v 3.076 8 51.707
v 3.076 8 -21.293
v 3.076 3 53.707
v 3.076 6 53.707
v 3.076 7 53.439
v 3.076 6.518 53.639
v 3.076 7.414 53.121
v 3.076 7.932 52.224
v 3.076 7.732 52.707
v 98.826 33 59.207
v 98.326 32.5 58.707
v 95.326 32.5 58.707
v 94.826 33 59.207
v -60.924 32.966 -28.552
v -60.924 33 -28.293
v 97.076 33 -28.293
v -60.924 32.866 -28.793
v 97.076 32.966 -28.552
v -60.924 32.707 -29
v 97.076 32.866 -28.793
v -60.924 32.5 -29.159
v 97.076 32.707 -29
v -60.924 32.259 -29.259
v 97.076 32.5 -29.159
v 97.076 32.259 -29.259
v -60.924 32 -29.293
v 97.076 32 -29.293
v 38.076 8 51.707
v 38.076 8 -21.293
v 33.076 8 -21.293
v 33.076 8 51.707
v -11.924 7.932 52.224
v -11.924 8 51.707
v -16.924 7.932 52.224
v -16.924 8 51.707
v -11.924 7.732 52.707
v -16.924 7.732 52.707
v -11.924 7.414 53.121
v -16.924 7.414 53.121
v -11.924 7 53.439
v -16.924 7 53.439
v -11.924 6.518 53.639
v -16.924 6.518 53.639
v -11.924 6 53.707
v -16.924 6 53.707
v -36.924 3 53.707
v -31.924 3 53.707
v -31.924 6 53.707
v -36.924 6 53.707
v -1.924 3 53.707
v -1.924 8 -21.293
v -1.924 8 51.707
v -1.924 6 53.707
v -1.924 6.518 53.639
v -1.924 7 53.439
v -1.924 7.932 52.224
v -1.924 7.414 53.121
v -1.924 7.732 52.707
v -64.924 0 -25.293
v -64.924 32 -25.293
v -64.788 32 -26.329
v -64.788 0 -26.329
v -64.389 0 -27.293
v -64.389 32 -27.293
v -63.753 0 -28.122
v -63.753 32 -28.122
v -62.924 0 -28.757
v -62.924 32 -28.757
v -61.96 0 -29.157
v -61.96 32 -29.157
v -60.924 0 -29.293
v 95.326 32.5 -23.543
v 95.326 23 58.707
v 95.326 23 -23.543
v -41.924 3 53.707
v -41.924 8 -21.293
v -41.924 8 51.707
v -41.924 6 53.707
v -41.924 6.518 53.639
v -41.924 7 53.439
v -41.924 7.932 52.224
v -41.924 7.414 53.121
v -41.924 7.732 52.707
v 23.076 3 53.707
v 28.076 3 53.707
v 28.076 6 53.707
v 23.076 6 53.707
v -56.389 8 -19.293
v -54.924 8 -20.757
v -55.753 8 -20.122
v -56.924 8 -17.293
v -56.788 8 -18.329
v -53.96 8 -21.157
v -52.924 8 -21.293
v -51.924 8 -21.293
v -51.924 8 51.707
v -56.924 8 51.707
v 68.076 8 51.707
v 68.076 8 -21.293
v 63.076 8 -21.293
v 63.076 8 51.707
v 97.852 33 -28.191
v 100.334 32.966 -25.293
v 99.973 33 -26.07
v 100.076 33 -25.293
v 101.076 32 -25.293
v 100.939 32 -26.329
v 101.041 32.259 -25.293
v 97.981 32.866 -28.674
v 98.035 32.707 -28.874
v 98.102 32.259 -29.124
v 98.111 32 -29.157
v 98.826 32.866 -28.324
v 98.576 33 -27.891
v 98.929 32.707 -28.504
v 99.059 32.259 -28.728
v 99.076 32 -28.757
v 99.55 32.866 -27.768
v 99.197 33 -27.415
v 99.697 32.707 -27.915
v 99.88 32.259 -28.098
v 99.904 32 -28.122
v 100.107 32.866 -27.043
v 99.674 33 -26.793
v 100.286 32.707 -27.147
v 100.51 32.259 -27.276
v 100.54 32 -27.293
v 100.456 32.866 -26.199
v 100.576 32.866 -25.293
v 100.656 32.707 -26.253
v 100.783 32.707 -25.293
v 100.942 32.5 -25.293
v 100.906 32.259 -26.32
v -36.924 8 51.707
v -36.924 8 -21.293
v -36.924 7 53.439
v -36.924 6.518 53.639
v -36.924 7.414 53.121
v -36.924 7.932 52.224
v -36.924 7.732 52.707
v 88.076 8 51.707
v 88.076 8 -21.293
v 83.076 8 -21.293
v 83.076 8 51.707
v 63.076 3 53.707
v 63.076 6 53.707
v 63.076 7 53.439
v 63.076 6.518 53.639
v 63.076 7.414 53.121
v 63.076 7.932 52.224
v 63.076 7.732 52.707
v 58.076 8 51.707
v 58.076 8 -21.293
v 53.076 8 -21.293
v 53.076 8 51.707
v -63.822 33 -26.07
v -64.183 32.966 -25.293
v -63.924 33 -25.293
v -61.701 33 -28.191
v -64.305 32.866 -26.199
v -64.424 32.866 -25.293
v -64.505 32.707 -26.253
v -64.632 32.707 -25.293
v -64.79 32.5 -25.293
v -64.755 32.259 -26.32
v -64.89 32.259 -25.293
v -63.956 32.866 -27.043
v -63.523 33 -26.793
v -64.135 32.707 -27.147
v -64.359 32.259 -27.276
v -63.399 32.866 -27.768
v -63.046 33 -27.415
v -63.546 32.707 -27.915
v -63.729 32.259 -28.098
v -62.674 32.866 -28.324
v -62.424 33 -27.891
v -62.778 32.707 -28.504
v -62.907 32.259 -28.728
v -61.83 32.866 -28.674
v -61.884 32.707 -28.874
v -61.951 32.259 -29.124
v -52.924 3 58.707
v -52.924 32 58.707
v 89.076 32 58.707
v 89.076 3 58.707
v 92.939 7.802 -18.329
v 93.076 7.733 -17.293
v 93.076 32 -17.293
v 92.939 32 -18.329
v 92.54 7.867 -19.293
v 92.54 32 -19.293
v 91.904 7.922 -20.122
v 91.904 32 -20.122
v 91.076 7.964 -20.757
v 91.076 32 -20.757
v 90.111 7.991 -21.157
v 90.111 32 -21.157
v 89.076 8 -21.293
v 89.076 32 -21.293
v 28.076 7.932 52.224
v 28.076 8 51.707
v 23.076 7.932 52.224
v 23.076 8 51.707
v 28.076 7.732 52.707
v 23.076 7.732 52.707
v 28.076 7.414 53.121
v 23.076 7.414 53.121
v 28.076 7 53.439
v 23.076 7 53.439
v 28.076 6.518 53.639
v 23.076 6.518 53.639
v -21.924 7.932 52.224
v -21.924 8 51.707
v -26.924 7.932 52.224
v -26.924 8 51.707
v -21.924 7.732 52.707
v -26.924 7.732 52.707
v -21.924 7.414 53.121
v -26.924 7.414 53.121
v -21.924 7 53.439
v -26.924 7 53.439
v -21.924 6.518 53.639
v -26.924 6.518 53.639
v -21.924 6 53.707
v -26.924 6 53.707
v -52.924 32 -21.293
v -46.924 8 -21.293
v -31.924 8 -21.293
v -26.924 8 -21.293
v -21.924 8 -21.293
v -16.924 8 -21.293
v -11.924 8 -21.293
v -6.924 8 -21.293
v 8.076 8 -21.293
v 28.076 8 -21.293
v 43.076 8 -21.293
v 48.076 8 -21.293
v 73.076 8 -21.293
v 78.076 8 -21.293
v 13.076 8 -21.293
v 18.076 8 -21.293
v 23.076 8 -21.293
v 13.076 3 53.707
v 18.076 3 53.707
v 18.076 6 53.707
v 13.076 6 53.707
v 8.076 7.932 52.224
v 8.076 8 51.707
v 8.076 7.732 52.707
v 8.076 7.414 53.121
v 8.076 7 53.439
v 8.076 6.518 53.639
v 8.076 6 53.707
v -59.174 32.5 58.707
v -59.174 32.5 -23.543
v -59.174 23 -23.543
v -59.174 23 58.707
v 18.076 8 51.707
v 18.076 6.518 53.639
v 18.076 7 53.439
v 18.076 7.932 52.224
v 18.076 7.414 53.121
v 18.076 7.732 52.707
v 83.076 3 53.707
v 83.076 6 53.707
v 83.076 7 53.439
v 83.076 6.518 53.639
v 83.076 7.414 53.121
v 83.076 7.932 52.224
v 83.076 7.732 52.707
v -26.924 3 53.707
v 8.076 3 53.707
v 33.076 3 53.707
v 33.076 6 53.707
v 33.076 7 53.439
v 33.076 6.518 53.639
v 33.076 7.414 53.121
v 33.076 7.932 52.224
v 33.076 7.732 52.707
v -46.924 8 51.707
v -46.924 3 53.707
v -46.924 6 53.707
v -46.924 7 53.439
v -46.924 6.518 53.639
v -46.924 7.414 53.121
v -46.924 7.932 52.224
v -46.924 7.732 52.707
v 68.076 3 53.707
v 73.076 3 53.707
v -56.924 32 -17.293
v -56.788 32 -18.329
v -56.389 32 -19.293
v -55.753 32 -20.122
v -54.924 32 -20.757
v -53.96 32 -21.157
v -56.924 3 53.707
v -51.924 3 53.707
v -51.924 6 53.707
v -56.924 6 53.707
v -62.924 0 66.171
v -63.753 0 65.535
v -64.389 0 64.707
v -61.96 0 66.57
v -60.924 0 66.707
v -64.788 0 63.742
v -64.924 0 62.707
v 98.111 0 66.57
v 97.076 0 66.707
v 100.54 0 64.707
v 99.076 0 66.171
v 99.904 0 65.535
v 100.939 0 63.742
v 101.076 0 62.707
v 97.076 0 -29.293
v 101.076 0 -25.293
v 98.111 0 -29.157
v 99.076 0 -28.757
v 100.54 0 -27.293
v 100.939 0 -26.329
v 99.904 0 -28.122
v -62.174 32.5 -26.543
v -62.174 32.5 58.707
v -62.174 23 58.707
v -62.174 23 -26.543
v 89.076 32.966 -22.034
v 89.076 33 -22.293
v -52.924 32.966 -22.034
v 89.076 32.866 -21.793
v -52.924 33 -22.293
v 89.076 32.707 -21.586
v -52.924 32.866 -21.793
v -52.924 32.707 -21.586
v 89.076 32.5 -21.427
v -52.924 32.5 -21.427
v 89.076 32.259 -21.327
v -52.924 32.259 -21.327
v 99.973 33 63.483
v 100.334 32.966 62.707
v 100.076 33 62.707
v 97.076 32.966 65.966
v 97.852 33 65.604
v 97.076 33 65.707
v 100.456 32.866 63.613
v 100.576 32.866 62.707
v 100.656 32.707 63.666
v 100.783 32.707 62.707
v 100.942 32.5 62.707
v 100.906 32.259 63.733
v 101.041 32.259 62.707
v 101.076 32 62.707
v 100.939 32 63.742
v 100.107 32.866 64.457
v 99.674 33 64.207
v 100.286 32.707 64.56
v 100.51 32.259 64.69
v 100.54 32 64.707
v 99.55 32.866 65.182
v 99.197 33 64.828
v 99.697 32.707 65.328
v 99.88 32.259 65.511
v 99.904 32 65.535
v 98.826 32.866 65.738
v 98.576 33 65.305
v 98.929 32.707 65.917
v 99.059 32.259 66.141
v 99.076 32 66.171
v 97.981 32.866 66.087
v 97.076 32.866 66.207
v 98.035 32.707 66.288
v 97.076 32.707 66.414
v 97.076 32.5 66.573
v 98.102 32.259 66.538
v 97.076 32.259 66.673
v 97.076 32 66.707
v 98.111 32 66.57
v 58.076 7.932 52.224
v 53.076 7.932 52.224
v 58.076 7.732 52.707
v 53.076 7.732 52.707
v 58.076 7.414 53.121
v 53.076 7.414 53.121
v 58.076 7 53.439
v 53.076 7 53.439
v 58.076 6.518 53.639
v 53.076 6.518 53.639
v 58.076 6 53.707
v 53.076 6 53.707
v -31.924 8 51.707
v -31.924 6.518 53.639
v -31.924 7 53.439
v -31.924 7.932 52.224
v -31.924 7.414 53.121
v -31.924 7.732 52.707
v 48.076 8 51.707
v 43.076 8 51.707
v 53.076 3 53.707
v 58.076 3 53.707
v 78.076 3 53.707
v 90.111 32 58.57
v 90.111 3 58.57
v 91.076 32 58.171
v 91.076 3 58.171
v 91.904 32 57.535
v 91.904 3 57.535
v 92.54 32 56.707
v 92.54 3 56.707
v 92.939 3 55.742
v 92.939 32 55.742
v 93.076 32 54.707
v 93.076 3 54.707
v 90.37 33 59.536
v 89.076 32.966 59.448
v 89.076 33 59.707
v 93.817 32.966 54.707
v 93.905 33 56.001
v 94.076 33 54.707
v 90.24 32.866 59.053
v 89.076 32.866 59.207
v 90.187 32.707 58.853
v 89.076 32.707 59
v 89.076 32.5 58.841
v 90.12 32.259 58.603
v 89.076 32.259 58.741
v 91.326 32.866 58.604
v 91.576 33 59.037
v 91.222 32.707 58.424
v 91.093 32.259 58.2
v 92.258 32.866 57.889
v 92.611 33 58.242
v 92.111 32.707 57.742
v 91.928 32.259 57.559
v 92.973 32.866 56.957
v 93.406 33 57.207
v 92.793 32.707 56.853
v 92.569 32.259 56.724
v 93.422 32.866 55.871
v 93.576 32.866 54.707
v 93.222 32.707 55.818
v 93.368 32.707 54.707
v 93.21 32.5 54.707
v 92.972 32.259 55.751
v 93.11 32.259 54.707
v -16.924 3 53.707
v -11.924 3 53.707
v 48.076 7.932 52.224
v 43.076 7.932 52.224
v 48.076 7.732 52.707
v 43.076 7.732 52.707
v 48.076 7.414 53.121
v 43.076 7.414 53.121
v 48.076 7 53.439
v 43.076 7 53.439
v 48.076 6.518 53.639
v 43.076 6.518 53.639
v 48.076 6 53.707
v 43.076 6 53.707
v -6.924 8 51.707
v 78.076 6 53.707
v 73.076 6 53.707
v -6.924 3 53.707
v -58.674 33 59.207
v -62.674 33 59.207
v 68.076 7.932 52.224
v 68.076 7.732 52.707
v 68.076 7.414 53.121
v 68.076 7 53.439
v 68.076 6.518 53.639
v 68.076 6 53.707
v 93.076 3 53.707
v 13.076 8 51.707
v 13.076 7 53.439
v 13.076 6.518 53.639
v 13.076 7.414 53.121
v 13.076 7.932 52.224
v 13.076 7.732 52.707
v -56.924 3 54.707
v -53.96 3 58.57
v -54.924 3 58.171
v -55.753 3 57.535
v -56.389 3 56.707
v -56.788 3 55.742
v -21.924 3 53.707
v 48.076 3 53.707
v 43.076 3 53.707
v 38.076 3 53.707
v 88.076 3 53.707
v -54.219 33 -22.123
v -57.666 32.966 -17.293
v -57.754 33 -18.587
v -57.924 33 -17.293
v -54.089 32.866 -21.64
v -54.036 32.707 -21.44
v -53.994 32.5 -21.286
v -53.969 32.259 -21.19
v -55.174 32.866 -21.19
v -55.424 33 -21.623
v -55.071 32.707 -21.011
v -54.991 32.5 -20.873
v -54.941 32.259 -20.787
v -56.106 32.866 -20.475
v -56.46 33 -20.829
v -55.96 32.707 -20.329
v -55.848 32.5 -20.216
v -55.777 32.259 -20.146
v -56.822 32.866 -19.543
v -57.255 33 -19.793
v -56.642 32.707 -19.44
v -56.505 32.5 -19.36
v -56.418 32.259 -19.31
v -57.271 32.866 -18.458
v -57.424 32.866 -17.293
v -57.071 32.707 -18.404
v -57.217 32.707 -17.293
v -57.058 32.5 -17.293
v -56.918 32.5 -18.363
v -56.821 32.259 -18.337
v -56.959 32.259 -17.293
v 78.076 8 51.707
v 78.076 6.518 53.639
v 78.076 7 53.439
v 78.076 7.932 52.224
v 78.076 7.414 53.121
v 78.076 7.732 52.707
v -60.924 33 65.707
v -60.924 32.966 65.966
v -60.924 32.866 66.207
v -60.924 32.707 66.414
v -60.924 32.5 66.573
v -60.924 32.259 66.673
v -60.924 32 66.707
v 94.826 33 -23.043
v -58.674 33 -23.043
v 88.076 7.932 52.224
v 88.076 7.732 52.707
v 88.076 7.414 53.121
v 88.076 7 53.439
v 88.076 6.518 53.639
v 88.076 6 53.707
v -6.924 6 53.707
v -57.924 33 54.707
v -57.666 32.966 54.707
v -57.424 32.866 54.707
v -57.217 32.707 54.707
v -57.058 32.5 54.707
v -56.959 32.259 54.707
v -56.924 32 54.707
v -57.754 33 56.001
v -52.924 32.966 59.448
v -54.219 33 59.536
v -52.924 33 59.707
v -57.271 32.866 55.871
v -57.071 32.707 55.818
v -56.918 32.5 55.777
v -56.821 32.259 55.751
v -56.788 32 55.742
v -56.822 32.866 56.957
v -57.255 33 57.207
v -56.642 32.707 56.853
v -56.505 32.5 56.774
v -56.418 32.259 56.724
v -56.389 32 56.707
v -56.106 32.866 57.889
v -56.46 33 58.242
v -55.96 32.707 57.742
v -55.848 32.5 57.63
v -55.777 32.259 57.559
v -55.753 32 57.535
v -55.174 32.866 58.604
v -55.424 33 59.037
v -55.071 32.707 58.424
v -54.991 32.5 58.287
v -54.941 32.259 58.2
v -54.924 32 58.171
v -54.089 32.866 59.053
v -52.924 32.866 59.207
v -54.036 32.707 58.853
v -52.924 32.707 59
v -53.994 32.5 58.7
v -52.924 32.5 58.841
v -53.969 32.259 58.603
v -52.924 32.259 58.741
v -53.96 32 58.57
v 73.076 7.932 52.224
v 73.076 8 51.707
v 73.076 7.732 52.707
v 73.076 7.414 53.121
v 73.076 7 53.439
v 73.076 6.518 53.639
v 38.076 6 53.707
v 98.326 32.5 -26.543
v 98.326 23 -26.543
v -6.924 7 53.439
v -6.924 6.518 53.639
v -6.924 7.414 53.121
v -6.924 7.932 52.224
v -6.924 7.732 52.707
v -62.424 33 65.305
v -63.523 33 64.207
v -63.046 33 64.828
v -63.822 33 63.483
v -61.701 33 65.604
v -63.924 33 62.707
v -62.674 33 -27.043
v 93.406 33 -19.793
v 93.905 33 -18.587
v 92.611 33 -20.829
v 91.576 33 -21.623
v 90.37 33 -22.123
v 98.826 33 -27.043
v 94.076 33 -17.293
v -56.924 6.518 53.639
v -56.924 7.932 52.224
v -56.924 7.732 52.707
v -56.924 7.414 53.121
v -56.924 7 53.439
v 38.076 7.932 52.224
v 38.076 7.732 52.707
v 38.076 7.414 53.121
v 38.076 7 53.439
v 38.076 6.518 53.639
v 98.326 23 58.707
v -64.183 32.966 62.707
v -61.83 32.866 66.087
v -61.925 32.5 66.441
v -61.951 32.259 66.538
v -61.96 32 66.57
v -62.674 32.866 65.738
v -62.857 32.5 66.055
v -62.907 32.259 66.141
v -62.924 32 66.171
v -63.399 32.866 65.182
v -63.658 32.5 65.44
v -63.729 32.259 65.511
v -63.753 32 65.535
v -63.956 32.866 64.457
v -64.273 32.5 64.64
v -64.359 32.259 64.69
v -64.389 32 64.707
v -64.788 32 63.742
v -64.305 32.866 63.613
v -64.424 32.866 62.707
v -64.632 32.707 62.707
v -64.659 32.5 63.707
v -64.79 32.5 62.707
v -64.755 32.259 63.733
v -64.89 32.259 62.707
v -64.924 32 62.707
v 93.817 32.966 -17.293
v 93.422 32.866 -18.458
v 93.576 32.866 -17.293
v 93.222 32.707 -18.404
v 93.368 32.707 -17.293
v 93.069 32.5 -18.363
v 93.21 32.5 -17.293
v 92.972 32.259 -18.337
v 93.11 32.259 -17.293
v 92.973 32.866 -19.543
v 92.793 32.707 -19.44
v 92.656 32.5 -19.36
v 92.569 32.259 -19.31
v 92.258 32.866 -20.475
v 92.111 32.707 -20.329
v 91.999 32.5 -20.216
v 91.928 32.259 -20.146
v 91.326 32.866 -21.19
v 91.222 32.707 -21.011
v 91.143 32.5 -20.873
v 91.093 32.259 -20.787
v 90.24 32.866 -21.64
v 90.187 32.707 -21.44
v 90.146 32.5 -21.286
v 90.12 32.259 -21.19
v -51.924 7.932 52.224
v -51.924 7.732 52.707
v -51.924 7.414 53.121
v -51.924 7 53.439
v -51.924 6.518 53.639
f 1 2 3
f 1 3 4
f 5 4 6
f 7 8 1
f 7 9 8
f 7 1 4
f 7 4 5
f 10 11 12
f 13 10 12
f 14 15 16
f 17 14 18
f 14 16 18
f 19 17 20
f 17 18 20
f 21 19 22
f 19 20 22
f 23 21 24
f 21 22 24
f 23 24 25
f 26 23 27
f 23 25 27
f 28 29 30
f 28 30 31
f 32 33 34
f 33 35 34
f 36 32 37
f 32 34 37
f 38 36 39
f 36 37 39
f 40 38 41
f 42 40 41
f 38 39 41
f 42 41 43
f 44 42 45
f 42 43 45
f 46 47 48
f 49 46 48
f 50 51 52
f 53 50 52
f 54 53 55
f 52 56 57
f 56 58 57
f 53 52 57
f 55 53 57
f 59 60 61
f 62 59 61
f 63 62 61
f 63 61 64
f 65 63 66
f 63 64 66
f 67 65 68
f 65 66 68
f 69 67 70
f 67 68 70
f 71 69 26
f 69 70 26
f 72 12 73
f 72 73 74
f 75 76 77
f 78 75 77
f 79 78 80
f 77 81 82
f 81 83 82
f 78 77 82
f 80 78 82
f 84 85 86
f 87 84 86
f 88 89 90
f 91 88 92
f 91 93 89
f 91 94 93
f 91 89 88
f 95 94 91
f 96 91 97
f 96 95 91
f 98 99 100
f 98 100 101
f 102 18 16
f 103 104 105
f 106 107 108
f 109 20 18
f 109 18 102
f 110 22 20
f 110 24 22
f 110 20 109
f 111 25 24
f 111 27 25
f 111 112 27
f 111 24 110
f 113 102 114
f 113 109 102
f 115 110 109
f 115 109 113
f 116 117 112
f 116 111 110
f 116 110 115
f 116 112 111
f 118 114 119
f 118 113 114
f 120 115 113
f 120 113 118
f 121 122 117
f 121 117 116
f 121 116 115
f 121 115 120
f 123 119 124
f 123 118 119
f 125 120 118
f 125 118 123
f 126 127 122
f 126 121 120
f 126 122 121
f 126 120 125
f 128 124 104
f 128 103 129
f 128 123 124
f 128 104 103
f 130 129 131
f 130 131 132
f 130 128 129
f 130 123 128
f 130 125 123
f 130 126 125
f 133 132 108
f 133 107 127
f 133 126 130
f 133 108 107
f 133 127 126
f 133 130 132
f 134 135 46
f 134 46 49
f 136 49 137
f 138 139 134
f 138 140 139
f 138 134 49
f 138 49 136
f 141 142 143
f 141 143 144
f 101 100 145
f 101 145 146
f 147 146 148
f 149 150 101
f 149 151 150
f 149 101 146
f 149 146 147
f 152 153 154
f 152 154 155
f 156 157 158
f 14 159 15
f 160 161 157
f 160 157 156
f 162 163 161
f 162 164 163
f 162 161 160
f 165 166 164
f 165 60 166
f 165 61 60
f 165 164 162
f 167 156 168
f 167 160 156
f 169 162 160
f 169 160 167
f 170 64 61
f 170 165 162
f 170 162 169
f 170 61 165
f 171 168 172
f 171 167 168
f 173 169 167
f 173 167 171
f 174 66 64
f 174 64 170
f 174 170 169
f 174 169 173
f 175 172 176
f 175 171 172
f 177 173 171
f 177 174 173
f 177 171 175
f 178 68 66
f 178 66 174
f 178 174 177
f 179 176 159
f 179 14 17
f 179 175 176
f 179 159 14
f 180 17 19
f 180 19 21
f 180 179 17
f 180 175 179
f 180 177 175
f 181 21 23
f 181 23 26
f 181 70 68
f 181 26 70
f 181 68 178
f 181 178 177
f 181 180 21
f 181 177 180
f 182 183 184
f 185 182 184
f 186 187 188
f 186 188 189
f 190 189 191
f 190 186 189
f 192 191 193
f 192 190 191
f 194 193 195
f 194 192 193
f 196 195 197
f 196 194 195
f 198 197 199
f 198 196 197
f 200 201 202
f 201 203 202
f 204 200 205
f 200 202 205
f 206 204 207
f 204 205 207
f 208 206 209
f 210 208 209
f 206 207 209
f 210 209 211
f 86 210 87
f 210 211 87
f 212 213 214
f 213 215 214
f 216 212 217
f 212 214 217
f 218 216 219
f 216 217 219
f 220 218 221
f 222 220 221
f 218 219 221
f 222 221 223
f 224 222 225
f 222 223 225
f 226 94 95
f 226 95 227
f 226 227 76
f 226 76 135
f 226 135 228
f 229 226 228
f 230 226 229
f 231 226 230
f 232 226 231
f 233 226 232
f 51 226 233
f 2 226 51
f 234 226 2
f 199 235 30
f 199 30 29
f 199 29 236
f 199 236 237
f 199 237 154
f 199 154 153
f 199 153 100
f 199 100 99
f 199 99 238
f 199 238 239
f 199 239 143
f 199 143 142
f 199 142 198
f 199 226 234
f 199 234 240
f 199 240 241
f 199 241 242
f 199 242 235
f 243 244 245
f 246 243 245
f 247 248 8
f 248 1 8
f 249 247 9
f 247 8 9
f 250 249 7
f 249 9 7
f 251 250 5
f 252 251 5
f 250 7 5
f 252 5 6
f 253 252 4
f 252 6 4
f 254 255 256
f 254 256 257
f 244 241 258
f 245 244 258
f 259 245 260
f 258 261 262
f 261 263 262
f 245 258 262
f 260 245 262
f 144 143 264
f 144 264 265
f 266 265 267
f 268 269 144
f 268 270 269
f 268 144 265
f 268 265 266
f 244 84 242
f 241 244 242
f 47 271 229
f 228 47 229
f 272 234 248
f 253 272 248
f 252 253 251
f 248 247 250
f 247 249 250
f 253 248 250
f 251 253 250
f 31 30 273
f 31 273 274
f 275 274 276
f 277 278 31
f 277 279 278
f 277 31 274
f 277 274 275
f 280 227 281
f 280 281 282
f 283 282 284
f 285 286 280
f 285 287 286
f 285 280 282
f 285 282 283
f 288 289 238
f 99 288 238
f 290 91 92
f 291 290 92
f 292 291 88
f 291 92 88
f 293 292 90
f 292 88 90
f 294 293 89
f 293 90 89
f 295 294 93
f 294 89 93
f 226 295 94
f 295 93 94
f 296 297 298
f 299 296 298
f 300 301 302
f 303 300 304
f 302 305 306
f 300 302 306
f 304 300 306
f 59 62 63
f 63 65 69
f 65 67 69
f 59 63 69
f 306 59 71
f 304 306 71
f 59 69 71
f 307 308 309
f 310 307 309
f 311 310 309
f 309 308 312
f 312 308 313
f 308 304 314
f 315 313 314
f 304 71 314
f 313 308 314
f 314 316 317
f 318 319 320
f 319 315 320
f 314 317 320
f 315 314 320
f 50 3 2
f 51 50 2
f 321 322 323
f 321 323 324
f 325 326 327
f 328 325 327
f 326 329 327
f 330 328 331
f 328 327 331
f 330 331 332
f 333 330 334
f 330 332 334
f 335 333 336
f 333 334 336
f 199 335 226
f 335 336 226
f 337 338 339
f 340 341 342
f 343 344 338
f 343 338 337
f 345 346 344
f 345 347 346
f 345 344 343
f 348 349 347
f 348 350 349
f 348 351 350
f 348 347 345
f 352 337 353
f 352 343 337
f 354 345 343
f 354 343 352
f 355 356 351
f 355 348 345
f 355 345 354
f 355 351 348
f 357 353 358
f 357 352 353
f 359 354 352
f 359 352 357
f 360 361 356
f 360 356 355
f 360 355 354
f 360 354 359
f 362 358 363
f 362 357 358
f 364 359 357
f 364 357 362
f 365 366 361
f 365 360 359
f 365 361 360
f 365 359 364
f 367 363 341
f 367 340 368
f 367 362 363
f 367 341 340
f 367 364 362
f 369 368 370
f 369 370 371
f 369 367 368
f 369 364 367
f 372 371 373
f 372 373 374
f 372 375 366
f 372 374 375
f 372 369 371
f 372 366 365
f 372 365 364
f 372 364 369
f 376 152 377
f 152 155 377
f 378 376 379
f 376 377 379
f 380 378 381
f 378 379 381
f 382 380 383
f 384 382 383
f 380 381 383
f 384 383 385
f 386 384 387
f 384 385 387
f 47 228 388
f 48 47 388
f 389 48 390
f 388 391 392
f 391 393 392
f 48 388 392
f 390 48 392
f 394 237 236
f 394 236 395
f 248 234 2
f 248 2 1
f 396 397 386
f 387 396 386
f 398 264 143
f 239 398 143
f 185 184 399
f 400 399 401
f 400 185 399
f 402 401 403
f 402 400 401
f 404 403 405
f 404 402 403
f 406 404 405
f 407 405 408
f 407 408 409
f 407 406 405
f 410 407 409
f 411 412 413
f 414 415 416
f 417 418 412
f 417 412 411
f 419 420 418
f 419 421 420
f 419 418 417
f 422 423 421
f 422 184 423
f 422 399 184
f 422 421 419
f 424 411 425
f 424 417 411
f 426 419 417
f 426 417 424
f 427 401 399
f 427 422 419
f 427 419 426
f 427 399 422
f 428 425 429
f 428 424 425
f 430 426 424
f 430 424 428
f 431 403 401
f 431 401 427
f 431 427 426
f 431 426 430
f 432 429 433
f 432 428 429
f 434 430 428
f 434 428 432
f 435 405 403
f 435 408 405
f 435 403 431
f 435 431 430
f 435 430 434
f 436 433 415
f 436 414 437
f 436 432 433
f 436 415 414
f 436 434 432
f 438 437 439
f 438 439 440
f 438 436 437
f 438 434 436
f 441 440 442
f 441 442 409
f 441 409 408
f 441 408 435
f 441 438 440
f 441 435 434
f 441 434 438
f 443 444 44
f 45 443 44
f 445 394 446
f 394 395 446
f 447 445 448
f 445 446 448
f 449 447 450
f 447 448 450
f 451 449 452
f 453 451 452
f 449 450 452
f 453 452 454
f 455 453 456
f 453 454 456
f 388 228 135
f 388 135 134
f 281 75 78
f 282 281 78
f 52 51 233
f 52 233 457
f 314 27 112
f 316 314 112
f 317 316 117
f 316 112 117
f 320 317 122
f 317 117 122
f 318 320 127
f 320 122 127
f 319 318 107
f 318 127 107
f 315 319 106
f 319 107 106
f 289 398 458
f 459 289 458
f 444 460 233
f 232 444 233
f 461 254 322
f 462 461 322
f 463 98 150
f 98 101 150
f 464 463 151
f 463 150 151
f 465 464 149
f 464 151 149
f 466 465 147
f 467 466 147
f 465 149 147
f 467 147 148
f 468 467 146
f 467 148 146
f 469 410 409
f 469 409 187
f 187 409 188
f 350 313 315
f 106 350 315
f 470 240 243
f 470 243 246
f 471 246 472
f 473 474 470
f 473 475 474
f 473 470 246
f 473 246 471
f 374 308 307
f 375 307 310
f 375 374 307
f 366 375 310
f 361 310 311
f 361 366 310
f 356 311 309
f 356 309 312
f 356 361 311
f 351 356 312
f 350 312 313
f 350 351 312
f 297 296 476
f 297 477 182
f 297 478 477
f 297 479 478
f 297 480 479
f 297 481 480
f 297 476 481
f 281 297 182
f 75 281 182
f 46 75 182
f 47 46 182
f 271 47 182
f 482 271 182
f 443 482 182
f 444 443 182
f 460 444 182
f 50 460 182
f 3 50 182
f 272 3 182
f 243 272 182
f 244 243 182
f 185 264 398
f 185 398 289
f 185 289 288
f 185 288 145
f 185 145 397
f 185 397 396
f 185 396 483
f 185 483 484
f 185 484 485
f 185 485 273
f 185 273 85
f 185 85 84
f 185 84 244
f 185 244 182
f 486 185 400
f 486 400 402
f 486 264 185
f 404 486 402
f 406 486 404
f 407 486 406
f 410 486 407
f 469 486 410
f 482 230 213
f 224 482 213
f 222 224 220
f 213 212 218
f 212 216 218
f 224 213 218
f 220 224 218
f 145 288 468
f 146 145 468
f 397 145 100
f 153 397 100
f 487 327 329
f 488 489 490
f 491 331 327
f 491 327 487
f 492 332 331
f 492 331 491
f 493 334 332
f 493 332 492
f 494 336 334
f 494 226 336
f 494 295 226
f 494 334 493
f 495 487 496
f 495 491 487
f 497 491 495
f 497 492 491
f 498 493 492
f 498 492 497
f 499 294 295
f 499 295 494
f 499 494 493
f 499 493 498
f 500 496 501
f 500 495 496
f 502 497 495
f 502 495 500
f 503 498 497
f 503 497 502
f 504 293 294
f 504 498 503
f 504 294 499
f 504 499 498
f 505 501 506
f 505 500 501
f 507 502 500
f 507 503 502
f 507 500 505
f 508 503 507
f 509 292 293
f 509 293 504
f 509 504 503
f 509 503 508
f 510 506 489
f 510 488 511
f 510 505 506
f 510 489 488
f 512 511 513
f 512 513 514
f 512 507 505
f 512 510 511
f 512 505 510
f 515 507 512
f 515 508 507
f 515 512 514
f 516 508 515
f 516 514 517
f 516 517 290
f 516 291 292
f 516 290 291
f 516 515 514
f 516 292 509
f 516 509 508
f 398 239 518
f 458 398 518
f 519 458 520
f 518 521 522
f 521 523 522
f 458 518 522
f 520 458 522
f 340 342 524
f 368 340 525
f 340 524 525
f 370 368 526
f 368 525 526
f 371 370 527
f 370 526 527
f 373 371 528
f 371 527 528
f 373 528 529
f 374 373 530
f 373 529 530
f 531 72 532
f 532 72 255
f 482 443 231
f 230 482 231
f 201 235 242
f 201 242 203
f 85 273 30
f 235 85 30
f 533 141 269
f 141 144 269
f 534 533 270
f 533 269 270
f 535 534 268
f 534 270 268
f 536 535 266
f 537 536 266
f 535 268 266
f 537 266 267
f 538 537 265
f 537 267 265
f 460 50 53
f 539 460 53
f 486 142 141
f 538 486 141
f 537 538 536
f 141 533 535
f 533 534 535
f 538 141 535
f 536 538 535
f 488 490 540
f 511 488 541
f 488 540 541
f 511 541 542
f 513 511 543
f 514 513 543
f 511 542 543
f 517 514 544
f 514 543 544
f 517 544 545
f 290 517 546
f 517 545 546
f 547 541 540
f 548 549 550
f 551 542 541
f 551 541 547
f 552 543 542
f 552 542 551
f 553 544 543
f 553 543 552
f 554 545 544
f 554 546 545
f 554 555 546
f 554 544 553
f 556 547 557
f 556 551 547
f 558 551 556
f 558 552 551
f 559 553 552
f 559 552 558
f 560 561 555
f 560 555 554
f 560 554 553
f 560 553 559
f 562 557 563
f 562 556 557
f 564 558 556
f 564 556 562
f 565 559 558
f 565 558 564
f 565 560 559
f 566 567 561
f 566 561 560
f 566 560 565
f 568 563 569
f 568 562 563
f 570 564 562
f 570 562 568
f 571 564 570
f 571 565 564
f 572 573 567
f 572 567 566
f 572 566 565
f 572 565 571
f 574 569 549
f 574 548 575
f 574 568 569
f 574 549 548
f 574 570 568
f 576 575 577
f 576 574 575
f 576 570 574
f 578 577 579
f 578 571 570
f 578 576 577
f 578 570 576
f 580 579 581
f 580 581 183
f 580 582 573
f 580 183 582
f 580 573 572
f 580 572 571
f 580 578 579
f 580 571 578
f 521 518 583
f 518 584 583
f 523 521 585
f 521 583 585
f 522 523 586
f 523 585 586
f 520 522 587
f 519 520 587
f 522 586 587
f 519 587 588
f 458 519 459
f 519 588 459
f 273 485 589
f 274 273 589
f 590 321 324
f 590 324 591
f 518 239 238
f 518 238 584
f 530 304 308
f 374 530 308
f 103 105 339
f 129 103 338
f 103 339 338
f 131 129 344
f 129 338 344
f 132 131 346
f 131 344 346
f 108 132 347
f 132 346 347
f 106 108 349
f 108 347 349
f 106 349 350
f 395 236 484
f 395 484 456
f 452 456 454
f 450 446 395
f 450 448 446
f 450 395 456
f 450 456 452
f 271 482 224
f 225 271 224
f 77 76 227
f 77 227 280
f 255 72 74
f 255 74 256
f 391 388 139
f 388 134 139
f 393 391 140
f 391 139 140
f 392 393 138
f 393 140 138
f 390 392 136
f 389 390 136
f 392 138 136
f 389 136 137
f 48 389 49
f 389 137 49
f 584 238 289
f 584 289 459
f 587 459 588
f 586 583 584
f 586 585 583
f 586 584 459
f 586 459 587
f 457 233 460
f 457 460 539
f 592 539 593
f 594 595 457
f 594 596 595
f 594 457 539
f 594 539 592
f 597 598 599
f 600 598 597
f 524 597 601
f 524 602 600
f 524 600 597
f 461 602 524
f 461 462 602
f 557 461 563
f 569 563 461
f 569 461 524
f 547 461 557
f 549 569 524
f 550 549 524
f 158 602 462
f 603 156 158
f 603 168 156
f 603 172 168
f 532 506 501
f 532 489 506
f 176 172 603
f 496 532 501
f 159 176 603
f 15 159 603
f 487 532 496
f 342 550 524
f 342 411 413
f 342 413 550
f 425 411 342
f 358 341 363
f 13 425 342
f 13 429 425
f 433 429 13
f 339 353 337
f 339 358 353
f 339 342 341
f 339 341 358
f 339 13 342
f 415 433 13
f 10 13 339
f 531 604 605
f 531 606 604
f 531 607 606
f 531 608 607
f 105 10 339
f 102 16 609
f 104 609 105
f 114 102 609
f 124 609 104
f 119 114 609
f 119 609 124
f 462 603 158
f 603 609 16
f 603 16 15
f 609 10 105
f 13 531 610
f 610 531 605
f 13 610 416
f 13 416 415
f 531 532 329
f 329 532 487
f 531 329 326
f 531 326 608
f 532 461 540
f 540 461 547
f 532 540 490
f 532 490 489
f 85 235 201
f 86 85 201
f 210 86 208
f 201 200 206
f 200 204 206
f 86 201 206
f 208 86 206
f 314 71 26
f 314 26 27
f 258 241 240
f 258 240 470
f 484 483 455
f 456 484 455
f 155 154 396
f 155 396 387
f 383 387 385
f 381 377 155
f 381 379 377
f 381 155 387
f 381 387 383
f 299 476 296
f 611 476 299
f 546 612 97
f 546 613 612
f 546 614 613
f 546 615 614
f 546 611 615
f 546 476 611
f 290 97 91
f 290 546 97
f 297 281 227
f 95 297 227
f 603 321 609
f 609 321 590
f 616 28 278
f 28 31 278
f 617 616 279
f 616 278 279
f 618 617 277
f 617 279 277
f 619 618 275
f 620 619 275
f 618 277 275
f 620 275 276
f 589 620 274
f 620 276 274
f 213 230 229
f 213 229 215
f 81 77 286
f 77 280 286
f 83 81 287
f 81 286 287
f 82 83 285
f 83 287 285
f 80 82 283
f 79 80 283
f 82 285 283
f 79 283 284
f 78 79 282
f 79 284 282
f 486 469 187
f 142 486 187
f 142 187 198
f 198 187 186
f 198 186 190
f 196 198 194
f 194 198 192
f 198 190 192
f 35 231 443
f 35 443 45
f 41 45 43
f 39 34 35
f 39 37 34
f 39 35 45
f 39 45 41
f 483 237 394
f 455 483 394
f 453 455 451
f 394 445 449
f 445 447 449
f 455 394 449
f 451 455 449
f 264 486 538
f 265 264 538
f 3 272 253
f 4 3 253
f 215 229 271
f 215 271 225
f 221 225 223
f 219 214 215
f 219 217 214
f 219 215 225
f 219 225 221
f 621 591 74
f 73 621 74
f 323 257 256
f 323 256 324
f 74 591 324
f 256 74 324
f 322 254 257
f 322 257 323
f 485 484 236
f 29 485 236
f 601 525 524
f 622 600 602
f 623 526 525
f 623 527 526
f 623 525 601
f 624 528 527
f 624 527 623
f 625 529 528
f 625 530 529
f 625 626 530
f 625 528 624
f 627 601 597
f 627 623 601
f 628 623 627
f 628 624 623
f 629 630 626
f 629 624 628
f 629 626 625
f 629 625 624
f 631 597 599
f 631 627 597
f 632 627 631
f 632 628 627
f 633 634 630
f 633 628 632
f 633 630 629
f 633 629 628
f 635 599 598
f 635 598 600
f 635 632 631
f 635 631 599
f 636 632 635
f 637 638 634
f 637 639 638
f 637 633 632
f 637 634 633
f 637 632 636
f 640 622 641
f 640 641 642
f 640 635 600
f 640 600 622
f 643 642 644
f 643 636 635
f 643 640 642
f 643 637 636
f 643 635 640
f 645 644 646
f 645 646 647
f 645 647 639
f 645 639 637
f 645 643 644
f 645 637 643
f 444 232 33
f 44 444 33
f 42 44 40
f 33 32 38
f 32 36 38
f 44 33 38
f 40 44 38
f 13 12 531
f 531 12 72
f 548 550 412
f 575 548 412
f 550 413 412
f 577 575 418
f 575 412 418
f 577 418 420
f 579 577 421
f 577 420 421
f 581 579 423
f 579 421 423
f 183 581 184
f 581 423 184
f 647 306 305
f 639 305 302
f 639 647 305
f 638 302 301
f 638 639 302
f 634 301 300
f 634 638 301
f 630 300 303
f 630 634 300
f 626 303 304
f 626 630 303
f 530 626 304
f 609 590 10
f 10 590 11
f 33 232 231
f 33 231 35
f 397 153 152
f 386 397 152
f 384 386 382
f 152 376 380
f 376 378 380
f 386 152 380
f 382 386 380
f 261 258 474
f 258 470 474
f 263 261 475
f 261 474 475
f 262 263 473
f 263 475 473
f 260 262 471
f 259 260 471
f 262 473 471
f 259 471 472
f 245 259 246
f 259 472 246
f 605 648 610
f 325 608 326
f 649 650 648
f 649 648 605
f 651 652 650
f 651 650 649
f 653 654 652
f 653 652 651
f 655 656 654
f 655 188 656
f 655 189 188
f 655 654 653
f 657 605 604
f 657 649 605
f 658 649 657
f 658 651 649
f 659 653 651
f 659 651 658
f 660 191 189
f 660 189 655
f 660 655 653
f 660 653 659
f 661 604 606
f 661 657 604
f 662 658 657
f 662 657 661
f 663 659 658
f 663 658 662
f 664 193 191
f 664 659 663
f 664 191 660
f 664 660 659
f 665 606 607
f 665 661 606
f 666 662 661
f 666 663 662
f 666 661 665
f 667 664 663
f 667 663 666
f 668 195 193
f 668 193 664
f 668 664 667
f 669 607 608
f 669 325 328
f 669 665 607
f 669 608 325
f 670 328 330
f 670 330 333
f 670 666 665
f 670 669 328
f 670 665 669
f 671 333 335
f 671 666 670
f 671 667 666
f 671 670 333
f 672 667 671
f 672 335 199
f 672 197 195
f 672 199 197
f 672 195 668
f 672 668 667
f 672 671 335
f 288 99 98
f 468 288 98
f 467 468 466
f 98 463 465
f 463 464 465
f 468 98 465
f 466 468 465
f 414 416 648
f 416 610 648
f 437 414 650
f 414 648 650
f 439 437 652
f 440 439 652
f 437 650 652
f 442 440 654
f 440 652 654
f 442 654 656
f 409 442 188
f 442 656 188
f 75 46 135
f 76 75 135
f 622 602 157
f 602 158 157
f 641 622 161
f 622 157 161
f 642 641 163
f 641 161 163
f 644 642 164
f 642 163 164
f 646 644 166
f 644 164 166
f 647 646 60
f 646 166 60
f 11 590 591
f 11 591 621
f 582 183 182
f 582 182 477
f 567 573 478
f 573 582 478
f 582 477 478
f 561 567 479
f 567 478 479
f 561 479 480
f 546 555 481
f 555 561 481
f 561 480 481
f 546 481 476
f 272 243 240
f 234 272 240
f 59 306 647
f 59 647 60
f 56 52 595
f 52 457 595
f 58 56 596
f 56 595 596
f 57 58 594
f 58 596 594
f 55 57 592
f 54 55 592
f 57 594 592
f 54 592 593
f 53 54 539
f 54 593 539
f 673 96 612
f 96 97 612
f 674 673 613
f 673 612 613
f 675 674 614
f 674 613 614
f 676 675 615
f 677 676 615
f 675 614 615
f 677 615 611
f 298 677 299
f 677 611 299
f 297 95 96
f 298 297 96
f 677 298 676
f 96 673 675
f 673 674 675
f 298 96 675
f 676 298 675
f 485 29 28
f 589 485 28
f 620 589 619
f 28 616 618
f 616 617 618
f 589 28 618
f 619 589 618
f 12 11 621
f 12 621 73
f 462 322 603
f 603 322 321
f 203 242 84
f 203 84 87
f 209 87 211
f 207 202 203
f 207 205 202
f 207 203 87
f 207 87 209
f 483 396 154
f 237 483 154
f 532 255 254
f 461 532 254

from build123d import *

# Parameters (mm, degrees)
SKETCH1_W           = 166
SKETCH1_H           = 96
BOSS_EXTRUDE1_DEPTH = 33
SKETCH2_W           = 150
SKETCH2_H           = 80
CUT_EXTRUDE1_DEPTH  = 30
BOSS_EXTRUDE2_DEPTH = 5
SKETCH5_W           = 75
SKETCH5_H           = 5
BOSS_EXTRUDE3_DEPTH = 5
LPATTERN1_COUNT     = 15
LPATTERN1_PITCH     = 10
CUT_EXTRUDE5_DEPTH  = 10
FILLET1_R           = 4
FILLET2_R           = 4
FILLET3_R           = 2
FILLET5_R           = 1
CHAMFER1_SIZE       = 0.5


with BuildPart() as part:
    # Sketch1 → Boss-Extrude1 (new body)
    with BuildSketch(Plane(origin=(0, 0, 0), x_dir=(1, 0, 0), z_dir=(0, 1, 0))):
        with Locations((18.075570249, -18.706715624)):
            Rectangle(SKETCH1_W, SKETCH1_H)
    extrude(amount=BOSS_EXTRUDE1_DEPTH)

    # Sketch2 → Cut-Extrude1 (cut)
    with BuildSketch(Plane(origin=(0, 33, 0), x_dir=(1, 0, 0), z_dir=(0, 1, 0))):
        with Locations((18.075570249, -18.706715624)):
            Rectangle(SKETCH2_W, SKETCH2_H)
    extrude(amount=-CUT_EXTRUDE1_DEPTH, mode=Mode.SUBTRACT)

    # Sketch4 → Boss-Extrude2 (add)
    with BuildSketch(Plane.ZY.offset(-93.075570249)):
        Polygon((53.706715624, 3), (-21.293284376, 8), (-21.293284376, 3), align=None)
    boss_extrude2 = extrude(amount=BOSS_EXTRUDE2_DEPTH)

    # Sketch5 → Boss-Extrude3 (add)
    with BuildSketch(Plane.ZY.offset(-88.075570249)):
        with Locations((16.206715624, 5.5)):
            Rectangle(SKETCH5_W, SKETCH5_H)
    boss_extrude3 = extrude(amount=BOSS_EXTRUDE3_DEPTH)

    # LPattern1: Boss-Extrude2, Boss-Extrude3 ×15
    with Locations(*[(-i * LPATTERN1_PITCH, 0, 0) for i in range(1, LPATTERN1_COUNT)]):
        add(boss_extrude2)
        add(boss_extrude3)

    # Sketch9 → Cut-Extrude5 (cut)
    with BuildSketch(Plane(origin=(0, 33, 0), x_dir=(1, 0, 0), z_dir=(0, 1, 0))):
        Polygon((-62.174429751, 26.543284376), (98.325570249, 26.543284376), (98.325570249, -58.706715624), (95.325570249, -58.706715624), (95.325570249, 23.543284376), (-59.174429751, 23.543284376), (-59.174429751, -58.706715624), (-62.174429751, -58.706715624), align=None)
    extrude(amount=-CUT_EXTRUDE5_DEPTH, mode=Mode.SUBTRACT)

    # Fillet1
    fillet1_edges = [part.edges().sort_by_distance(p)[0] for p in [
        (-64.924429751, 16.5, -29.293284376),
        (101.075570249, 16.5, -29.293284376),
        (101.075570249, 16.5, 66.706715624),
        (-64.924429751, 16.5, 66.706715624),
    ]]
    fillet(fillet1_edges, radius=FILLET1_R)

    # Fillet2
    fillet2_edges = [part.edges().sort_by_distance(p)[0] for p in [
        (-56.924429751, 18, 58.706715624),
        (93.075570249, 18, 58.706715624),
        (93.075570249, 20.5, -21.293284376),
        (-56.924429751, 20.5, -21.293284376),
    ]]
    fillet(fillet2_edges, radius=FILLET2_R)

    # Fillet3
    fillet3_edges = [part.edges().sort_by_distance(p)[0] for p in [
        (75.575570249, 8, 53.706715624),
        (65.575570249, 8, 53.706715624),
        (55.575570249, 8, 53.706715624),
        (45.575570249, 8, 53.706715624),
        (35.575570249, 8, 53.706715624),
        (25.575570249, 8, 53.706715624),
        (15.575570249, 8, 53.706715624),
        (5.575570249, 8, 53.706715624),
        (-4.424429751, 8, 53.706715624),
        (-14.424429751, 8, 53.706715624),
        (-24.424429751, 8, 53.706715624),
        (-34.424429751, 8, 53.706715624),
        (-44.424429751, 8, 53.706715624),
        (-54.424429751, 8, 53.706715624),
        (85.575570249, 8, 53.706715624),
    ]]
    fillet(fillet3_edges, radius=FILLET3_R)

    # Fillet5
    fillet5_edges = [part.edges().sort_by_distance(p)[0] for p in [
        (-64.924429751, 33, 18.706715624),
        (18.075570249, 33, -29.293284376),
        (18.075570249, 33, 66.706715624),
        (101.075570249, 33, 18.706715624),
        (-63.752856875, 33, 65.535142749),
        (99.903997374, 33, 65.535142749),
        (99.903997374, 33, -28.1217115),
        (-63.752856875, 33, -28.1217115),
        (93.075570249, 33, 18.706715624),
        (18.075570249, 33, 58.706715624),
        (18.075570249, 33, -21.293284376),
        (-56.924429751, 33, 18.706715624),
        (91.903997374, 33, 57.535142749),
        (91.903997374, 33, -20.1217115),
        (-55.752856875, 33, -20.1217115),
        (-55.752856875, 33, 57.535142749),
    ]]
    fillet(fillet5_edges, radius=FILLET5_R)

    # Chamfer1
    chamfer1_edges = [part.edges().sort_by_distance(p)[0] for p in [
        (-62.174429751, 33, 16.081715624),
        (-60.674429751, 33, 58.706715624),
        (-59.174429751, 33, 17.581715624),
        (18.075570249, 33, -23.543284376),
        (95.325570249, 33, 17.581715624),
        (96.825570249, 33, 58.706715624),
        (98.325570249, 33, 16.081715624),
        (18.075570249, 33, -26.543284376),
    ]]
    chamfer(chamfer1_edges, length=CHAMFER1_SIZE)


solid = part.part
